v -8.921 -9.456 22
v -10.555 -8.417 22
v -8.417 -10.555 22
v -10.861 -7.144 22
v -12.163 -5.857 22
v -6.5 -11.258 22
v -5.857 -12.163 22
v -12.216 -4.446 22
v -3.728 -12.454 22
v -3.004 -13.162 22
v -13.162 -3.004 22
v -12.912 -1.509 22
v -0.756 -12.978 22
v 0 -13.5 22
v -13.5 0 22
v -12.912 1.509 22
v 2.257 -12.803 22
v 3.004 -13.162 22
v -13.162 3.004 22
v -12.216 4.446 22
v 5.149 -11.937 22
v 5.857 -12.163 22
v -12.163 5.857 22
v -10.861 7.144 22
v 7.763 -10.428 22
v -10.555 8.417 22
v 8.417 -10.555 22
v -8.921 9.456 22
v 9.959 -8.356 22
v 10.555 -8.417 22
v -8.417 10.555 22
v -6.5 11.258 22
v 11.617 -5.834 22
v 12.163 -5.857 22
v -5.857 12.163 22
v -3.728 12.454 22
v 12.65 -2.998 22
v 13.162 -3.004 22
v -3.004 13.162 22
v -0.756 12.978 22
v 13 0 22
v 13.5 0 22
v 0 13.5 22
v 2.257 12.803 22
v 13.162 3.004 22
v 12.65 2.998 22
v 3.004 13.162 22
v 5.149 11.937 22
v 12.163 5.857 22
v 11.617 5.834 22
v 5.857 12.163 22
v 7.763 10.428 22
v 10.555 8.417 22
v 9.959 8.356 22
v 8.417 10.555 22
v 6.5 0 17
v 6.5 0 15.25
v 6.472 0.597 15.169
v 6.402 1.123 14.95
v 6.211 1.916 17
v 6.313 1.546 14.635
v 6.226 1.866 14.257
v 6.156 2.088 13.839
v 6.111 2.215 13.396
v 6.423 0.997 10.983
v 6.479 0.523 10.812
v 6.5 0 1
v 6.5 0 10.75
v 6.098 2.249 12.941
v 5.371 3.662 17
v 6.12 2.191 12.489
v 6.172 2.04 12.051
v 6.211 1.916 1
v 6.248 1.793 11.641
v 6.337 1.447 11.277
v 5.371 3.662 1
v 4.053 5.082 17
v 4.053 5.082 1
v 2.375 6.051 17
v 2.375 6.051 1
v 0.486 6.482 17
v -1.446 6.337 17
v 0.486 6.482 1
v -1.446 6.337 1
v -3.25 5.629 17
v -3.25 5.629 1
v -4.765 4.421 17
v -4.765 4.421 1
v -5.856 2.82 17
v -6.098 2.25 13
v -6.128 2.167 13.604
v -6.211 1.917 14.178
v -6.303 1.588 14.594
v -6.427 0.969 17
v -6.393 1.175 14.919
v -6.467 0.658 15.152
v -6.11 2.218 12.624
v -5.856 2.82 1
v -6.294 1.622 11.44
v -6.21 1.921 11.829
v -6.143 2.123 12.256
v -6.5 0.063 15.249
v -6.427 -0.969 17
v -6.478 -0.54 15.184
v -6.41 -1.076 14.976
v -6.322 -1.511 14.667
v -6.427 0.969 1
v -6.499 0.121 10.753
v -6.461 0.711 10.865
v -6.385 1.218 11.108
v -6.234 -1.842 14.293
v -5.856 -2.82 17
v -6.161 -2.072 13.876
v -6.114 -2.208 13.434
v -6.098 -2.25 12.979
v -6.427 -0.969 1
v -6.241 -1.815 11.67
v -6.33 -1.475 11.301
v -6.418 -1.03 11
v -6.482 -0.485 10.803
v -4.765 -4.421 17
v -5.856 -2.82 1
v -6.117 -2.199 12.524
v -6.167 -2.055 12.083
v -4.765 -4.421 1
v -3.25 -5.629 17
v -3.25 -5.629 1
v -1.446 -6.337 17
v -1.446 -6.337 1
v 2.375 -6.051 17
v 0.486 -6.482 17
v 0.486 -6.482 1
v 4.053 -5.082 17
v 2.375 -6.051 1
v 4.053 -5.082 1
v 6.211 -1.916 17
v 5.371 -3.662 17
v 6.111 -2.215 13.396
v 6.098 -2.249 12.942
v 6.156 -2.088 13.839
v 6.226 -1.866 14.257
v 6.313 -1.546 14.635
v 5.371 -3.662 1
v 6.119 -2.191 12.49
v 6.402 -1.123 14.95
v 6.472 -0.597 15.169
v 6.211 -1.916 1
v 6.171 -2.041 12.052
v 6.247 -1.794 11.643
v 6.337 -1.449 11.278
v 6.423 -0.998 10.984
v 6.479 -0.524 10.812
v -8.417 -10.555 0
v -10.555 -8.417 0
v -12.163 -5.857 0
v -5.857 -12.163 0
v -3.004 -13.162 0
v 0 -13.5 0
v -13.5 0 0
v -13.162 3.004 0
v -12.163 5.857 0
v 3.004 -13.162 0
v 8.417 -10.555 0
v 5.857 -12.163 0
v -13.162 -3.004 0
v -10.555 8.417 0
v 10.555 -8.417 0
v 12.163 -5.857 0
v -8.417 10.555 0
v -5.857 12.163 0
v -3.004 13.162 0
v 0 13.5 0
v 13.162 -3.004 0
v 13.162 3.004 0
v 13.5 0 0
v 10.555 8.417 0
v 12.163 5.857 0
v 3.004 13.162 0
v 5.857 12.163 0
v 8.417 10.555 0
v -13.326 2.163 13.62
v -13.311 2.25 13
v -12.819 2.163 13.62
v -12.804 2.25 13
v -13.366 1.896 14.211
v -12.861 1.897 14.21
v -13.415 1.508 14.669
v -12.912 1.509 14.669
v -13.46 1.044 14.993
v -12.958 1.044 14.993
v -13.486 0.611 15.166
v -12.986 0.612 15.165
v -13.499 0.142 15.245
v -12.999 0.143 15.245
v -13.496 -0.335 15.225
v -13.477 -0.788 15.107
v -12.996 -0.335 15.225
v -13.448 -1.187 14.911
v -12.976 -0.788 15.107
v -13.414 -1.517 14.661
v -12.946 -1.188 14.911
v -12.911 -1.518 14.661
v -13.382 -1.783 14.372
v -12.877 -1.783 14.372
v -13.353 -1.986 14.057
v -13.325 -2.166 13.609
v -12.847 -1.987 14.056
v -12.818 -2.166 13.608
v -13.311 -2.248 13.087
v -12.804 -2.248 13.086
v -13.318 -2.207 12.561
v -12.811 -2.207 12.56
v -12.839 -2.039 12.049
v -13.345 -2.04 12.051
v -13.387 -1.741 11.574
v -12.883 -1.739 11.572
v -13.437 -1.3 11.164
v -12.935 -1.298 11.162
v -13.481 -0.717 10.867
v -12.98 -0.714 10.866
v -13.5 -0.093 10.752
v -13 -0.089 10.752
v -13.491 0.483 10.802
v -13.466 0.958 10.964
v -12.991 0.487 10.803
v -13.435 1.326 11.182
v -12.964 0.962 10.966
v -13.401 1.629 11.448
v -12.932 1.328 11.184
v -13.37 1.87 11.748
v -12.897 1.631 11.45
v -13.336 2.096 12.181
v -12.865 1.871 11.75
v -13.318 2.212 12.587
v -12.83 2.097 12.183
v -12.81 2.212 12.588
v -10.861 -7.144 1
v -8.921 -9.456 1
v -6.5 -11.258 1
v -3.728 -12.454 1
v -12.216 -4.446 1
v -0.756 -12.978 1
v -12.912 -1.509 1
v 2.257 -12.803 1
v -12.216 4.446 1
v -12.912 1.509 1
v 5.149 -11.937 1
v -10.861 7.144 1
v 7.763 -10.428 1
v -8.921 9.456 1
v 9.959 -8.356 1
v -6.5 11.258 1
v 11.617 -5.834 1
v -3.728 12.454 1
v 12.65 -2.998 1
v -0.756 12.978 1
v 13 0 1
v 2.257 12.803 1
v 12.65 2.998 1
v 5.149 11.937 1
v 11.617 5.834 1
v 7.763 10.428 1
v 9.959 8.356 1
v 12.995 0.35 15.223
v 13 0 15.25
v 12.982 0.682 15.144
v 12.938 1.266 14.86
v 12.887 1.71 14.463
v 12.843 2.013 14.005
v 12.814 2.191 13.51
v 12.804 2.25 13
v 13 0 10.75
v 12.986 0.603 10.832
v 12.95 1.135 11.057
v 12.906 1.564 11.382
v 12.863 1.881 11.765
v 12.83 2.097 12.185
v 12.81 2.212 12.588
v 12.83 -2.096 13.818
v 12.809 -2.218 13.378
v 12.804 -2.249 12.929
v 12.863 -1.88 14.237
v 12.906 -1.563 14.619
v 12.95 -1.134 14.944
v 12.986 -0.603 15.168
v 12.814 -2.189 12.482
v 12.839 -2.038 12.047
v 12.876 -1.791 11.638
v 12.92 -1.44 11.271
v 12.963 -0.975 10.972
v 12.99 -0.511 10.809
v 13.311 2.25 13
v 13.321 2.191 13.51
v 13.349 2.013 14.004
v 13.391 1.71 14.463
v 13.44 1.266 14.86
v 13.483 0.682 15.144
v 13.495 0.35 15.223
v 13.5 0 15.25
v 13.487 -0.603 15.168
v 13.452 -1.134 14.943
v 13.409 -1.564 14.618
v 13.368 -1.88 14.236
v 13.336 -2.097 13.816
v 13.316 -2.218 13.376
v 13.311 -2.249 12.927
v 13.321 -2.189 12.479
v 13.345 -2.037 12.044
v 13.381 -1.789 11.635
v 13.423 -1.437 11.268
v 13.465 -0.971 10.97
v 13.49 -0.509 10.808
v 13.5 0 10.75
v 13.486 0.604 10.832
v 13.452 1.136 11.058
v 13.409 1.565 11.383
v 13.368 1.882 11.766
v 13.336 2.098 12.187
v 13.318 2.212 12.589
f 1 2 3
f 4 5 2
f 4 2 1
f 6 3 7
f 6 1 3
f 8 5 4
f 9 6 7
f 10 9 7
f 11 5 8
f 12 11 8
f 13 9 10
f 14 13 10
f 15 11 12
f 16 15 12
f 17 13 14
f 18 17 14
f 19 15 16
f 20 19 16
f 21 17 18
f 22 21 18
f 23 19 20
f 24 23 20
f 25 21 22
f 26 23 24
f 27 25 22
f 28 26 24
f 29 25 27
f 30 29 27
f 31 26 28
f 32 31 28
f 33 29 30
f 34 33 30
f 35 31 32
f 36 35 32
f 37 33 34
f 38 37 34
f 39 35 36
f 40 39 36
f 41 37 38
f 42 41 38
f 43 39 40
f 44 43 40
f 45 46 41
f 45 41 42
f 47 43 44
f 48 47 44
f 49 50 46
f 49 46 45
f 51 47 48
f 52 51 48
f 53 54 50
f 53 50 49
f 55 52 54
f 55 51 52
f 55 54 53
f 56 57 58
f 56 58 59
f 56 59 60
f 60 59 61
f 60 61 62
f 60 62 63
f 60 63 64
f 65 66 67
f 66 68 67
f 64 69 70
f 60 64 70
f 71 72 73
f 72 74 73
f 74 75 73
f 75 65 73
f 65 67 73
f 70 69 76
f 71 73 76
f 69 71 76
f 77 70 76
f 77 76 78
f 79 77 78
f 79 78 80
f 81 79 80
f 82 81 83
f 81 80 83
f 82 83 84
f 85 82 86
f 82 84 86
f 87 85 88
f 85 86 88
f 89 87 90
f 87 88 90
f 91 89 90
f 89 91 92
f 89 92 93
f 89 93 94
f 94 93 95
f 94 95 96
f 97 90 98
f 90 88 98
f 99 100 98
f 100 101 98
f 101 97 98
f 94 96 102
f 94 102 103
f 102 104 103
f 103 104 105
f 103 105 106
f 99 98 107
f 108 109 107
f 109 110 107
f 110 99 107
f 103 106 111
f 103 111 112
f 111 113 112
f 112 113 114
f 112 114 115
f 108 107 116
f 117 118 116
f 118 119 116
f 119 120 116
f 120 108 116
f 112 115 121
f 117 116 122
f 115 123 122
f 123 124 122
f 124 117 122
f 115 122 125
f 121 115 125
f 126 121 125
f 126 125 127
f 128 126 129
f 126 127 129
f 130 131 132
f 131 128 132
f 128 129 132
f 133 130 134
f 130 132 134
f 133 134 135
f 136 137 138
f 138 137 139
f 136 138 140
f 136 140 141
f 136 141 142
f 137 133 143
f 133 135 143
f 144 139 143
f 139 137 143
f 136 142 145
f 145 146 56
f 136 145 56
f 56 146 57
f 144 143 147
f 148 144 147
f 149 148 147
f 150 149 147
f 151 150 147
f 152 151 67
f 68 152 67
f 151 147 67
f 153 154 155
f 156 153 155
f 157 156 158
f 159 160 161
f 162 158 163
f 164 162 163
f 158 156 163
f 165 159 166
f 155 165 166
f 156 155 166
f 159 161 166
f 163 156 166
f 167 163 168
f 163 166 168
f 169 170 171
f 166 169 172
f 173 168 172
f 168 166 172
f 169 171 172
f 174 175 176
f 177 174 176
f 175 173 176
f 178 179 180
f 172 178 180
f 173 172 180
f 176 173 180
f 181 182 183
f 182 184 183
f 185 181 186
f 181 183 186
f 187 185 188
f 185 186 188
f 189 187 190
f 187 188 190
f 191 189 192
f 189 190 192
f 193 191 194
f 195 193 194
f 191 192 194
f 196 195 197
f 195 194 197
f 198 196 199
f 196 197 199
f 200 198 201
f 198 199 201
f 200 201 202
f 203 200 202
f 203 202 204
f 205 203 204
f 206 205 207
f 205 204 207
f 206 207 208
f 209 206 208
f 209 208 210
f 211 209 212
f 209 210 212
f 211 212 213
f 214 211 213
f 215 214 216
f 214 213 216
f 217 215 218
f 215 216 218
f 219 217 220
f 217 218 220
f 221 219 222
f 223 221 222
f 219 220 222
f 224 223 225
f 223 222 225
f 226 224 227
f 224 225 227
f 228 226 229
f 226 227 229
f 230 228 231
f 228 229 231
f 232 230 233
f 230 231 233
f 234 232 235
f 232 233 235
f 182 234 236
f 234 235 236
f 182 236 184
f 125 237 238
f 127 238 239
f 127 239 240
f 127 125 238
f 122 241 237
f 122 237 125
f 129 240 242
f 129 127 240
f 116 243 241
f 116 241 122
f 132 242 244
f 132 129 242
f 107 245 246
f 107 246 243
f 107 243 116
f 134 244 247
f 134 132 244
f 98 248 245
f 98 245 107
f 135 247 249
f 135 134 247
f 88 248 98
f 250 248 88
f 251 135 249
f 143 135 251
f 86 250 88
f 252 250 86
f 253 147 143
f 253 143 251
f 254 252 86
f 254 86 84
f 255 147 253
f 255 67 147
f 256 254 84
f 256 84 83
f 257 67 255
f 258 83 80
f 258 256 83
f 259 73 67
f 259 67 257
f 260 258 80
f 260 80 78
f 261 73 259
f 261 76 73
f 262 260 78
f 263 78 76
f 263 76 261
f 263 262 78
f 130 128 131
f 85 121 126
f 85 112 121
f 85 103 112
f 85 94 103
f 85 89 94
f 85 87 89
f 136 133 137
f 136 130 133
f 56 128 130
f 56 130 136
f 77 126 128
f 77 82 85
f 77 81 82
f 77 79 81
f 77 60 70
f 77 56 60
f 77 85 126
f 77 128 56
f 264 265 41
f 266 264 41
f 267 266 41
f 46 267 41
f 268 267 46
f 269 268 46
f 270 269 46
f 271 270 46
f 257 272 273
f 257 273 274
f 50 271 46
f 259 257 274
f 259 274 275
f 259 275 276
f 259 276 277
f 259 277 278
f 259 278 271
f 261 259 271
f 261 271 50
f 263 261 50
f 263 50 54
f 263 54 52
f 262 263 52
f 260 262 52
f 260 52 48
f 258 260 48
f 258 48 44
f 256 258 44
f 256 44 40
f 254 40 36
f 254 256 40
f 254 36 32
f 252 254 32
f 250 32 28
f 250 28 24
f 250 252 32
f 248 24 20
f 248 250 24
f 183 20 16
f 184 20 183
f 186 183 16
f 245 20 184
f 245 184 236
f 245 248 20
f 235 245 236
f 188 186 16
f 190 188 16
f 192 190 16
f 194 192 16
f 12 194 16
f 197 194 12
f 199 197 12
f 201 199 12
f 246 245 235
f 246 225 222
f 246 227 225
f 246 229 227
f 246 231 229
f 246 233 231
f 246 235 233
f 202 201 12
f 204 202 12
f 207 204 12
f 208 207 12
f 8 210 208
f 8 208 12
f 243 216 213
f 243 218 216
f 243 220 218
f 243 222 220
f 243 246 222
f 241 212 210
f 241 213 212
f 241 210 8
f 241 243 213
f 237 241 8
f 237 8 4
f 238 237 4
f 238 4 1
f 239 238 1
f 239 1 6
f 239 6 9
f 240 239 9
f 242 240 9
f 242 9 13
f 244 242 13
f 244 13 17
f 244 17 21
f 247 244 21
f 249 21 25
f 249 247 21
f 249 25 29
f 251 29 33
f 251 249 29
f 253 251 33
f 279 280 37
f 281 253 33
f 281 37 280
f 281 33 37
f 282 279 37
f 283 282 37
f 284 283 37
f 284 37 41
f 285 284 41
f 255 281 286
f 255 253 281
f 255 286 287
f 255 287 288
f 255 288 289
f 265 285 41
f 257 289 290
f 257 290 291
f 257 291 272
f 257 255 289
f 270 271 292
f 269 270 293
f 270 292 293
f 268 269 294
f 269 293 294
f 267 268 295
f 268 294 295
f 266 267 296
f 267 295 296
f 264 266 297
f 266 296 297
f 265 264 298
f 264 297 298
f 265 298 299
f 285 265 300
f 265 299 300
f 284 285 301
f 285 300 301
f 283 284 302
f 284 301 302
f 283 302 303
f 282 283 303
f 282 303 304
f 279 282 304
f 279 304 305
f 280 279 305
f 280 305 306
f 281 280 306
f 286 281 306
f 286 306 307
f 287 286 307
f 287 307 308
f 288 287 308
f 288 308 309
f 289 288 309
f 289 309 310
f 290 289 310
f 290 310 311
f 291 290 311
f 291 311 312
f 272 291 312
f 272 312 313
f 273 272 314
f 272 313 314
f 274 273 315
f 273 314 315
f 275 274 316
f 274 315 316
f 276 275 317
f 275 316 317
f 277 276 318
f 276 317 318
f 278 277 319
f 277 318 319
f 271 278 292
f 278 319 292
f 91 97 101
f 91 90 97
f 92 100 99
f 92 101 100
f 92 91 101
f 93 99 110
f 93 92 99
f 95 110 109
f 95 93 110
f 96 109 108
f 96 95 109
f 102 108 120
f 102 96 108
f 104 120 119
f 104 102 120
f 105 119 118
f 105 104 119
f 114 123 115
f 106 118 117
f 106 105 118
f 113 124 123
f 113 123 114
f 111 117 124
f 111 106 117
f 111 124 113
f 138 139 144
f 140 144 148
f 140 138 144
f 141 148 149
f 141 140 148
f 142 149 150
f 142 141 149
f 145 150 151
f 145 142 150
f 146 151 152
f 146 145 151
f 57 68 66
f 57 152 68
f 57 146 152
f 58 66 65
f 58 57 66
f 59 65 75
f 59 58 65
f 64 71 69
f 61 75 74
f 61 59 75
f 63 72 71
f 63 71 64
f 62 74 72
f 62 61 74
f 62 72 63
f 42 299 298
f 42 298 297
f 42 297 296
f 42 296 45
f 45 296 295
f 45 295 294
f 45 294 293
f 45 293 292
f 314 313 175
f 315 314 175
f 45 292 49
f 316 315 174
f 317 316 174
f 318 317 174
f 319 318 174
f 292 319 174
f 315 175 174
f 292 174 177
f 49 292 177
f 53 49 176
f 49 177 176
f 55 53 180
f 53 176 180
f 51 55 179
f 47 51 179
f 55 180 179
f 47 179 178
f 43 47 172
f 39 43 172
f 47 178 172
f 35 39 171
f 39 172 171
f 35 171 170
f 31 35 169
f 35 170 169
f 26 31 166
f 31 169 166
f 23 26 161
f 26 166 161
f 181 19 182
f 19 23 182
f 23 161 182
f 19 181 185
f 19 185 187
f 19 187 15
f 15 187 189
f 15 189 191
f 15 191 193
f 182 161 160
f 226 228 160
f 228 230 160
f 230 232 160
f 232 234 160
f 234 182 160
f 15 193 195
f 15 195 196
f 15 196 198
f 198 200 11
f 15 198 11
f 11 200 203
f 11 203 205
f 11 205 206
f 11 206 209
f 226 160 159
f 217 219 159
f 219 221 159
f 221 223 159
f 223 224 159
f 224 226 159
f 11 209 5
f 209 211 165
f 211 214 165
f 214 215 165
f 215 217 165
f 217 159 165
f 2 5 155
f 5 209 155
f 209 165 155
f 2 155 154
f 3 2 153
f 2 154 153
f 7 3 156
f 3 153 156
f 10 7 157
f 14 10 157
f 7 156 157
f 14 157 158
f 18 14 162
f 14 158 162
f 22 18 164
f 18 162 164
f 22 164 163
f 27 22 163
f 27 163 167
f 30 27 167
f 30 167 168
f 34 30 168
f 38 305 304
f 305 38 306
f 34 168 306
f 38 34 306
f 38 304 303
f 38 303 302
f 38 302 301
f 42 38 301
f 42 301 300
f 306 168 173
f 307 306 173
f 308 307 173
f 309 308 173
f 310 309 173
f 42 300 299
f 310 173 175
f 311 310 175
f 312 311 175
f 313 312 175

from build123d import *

# Parameters (mm, degrees)
SKETCH_R        = 13.5
PAD_DEPTH       = 1
SKETCH001_R     = 13.5
SKETCH001_R_2   = 13
PAD001_DEPTH    = 21
SKETCH002_R     = 6.5
PAD002_DEPTH    = 16
SKETCH003_R     = 2.25
POCKET_DEPTH    = 15.5
POCKET_FACE11_R = 6.5
PAD003_DEPTH    = 16


with BuildPart() as part:
    # Sketch → Pad (new body)
    with BuildSketch(Plane.XY):
        Circle(SKETCH_R)
    extrude(amount=PAD_DEPTH)

    # Sketch001 (on Face3 of Pad) → Pad001 (join)
    with BuildSketch(Plane.XY.offset(1)):
        Circle(SKETCH001_R)
        Circle(SKETCH001_R_2, mode=Mode.SUBTRACT)
    extrude(amount=PAD001_DEPTH)

    # Sketch002 (on Face6 of Pad001) → Pad002 (join)
    with BuildSketch(Plane.XY.offset(1)):
        Circle(SKETCH002_R)
    extrude(amount=PAD002_DEPTH)

    # Sketch003 → Pocket (cut, symmetric)
    with BuildSketch(Plane.YZ):
        with Locations((0, 13)):
            Circle(SKETCH003_R)
    extrude(amount=POCKET_DEPTH, both=True, mode=Mode.SUBTRACT)

    # Pocket Face11 → Pad003 (add)
    with BuildSketch(Plane(origin=(0, 0, 17), x_dir=(0, 1, 0), z_dir=(0, 0, 1))):
        Circle(POCKET_FACE11_R)
    extrude(amount=-PAD003_DEPTH)


solid = part.part
